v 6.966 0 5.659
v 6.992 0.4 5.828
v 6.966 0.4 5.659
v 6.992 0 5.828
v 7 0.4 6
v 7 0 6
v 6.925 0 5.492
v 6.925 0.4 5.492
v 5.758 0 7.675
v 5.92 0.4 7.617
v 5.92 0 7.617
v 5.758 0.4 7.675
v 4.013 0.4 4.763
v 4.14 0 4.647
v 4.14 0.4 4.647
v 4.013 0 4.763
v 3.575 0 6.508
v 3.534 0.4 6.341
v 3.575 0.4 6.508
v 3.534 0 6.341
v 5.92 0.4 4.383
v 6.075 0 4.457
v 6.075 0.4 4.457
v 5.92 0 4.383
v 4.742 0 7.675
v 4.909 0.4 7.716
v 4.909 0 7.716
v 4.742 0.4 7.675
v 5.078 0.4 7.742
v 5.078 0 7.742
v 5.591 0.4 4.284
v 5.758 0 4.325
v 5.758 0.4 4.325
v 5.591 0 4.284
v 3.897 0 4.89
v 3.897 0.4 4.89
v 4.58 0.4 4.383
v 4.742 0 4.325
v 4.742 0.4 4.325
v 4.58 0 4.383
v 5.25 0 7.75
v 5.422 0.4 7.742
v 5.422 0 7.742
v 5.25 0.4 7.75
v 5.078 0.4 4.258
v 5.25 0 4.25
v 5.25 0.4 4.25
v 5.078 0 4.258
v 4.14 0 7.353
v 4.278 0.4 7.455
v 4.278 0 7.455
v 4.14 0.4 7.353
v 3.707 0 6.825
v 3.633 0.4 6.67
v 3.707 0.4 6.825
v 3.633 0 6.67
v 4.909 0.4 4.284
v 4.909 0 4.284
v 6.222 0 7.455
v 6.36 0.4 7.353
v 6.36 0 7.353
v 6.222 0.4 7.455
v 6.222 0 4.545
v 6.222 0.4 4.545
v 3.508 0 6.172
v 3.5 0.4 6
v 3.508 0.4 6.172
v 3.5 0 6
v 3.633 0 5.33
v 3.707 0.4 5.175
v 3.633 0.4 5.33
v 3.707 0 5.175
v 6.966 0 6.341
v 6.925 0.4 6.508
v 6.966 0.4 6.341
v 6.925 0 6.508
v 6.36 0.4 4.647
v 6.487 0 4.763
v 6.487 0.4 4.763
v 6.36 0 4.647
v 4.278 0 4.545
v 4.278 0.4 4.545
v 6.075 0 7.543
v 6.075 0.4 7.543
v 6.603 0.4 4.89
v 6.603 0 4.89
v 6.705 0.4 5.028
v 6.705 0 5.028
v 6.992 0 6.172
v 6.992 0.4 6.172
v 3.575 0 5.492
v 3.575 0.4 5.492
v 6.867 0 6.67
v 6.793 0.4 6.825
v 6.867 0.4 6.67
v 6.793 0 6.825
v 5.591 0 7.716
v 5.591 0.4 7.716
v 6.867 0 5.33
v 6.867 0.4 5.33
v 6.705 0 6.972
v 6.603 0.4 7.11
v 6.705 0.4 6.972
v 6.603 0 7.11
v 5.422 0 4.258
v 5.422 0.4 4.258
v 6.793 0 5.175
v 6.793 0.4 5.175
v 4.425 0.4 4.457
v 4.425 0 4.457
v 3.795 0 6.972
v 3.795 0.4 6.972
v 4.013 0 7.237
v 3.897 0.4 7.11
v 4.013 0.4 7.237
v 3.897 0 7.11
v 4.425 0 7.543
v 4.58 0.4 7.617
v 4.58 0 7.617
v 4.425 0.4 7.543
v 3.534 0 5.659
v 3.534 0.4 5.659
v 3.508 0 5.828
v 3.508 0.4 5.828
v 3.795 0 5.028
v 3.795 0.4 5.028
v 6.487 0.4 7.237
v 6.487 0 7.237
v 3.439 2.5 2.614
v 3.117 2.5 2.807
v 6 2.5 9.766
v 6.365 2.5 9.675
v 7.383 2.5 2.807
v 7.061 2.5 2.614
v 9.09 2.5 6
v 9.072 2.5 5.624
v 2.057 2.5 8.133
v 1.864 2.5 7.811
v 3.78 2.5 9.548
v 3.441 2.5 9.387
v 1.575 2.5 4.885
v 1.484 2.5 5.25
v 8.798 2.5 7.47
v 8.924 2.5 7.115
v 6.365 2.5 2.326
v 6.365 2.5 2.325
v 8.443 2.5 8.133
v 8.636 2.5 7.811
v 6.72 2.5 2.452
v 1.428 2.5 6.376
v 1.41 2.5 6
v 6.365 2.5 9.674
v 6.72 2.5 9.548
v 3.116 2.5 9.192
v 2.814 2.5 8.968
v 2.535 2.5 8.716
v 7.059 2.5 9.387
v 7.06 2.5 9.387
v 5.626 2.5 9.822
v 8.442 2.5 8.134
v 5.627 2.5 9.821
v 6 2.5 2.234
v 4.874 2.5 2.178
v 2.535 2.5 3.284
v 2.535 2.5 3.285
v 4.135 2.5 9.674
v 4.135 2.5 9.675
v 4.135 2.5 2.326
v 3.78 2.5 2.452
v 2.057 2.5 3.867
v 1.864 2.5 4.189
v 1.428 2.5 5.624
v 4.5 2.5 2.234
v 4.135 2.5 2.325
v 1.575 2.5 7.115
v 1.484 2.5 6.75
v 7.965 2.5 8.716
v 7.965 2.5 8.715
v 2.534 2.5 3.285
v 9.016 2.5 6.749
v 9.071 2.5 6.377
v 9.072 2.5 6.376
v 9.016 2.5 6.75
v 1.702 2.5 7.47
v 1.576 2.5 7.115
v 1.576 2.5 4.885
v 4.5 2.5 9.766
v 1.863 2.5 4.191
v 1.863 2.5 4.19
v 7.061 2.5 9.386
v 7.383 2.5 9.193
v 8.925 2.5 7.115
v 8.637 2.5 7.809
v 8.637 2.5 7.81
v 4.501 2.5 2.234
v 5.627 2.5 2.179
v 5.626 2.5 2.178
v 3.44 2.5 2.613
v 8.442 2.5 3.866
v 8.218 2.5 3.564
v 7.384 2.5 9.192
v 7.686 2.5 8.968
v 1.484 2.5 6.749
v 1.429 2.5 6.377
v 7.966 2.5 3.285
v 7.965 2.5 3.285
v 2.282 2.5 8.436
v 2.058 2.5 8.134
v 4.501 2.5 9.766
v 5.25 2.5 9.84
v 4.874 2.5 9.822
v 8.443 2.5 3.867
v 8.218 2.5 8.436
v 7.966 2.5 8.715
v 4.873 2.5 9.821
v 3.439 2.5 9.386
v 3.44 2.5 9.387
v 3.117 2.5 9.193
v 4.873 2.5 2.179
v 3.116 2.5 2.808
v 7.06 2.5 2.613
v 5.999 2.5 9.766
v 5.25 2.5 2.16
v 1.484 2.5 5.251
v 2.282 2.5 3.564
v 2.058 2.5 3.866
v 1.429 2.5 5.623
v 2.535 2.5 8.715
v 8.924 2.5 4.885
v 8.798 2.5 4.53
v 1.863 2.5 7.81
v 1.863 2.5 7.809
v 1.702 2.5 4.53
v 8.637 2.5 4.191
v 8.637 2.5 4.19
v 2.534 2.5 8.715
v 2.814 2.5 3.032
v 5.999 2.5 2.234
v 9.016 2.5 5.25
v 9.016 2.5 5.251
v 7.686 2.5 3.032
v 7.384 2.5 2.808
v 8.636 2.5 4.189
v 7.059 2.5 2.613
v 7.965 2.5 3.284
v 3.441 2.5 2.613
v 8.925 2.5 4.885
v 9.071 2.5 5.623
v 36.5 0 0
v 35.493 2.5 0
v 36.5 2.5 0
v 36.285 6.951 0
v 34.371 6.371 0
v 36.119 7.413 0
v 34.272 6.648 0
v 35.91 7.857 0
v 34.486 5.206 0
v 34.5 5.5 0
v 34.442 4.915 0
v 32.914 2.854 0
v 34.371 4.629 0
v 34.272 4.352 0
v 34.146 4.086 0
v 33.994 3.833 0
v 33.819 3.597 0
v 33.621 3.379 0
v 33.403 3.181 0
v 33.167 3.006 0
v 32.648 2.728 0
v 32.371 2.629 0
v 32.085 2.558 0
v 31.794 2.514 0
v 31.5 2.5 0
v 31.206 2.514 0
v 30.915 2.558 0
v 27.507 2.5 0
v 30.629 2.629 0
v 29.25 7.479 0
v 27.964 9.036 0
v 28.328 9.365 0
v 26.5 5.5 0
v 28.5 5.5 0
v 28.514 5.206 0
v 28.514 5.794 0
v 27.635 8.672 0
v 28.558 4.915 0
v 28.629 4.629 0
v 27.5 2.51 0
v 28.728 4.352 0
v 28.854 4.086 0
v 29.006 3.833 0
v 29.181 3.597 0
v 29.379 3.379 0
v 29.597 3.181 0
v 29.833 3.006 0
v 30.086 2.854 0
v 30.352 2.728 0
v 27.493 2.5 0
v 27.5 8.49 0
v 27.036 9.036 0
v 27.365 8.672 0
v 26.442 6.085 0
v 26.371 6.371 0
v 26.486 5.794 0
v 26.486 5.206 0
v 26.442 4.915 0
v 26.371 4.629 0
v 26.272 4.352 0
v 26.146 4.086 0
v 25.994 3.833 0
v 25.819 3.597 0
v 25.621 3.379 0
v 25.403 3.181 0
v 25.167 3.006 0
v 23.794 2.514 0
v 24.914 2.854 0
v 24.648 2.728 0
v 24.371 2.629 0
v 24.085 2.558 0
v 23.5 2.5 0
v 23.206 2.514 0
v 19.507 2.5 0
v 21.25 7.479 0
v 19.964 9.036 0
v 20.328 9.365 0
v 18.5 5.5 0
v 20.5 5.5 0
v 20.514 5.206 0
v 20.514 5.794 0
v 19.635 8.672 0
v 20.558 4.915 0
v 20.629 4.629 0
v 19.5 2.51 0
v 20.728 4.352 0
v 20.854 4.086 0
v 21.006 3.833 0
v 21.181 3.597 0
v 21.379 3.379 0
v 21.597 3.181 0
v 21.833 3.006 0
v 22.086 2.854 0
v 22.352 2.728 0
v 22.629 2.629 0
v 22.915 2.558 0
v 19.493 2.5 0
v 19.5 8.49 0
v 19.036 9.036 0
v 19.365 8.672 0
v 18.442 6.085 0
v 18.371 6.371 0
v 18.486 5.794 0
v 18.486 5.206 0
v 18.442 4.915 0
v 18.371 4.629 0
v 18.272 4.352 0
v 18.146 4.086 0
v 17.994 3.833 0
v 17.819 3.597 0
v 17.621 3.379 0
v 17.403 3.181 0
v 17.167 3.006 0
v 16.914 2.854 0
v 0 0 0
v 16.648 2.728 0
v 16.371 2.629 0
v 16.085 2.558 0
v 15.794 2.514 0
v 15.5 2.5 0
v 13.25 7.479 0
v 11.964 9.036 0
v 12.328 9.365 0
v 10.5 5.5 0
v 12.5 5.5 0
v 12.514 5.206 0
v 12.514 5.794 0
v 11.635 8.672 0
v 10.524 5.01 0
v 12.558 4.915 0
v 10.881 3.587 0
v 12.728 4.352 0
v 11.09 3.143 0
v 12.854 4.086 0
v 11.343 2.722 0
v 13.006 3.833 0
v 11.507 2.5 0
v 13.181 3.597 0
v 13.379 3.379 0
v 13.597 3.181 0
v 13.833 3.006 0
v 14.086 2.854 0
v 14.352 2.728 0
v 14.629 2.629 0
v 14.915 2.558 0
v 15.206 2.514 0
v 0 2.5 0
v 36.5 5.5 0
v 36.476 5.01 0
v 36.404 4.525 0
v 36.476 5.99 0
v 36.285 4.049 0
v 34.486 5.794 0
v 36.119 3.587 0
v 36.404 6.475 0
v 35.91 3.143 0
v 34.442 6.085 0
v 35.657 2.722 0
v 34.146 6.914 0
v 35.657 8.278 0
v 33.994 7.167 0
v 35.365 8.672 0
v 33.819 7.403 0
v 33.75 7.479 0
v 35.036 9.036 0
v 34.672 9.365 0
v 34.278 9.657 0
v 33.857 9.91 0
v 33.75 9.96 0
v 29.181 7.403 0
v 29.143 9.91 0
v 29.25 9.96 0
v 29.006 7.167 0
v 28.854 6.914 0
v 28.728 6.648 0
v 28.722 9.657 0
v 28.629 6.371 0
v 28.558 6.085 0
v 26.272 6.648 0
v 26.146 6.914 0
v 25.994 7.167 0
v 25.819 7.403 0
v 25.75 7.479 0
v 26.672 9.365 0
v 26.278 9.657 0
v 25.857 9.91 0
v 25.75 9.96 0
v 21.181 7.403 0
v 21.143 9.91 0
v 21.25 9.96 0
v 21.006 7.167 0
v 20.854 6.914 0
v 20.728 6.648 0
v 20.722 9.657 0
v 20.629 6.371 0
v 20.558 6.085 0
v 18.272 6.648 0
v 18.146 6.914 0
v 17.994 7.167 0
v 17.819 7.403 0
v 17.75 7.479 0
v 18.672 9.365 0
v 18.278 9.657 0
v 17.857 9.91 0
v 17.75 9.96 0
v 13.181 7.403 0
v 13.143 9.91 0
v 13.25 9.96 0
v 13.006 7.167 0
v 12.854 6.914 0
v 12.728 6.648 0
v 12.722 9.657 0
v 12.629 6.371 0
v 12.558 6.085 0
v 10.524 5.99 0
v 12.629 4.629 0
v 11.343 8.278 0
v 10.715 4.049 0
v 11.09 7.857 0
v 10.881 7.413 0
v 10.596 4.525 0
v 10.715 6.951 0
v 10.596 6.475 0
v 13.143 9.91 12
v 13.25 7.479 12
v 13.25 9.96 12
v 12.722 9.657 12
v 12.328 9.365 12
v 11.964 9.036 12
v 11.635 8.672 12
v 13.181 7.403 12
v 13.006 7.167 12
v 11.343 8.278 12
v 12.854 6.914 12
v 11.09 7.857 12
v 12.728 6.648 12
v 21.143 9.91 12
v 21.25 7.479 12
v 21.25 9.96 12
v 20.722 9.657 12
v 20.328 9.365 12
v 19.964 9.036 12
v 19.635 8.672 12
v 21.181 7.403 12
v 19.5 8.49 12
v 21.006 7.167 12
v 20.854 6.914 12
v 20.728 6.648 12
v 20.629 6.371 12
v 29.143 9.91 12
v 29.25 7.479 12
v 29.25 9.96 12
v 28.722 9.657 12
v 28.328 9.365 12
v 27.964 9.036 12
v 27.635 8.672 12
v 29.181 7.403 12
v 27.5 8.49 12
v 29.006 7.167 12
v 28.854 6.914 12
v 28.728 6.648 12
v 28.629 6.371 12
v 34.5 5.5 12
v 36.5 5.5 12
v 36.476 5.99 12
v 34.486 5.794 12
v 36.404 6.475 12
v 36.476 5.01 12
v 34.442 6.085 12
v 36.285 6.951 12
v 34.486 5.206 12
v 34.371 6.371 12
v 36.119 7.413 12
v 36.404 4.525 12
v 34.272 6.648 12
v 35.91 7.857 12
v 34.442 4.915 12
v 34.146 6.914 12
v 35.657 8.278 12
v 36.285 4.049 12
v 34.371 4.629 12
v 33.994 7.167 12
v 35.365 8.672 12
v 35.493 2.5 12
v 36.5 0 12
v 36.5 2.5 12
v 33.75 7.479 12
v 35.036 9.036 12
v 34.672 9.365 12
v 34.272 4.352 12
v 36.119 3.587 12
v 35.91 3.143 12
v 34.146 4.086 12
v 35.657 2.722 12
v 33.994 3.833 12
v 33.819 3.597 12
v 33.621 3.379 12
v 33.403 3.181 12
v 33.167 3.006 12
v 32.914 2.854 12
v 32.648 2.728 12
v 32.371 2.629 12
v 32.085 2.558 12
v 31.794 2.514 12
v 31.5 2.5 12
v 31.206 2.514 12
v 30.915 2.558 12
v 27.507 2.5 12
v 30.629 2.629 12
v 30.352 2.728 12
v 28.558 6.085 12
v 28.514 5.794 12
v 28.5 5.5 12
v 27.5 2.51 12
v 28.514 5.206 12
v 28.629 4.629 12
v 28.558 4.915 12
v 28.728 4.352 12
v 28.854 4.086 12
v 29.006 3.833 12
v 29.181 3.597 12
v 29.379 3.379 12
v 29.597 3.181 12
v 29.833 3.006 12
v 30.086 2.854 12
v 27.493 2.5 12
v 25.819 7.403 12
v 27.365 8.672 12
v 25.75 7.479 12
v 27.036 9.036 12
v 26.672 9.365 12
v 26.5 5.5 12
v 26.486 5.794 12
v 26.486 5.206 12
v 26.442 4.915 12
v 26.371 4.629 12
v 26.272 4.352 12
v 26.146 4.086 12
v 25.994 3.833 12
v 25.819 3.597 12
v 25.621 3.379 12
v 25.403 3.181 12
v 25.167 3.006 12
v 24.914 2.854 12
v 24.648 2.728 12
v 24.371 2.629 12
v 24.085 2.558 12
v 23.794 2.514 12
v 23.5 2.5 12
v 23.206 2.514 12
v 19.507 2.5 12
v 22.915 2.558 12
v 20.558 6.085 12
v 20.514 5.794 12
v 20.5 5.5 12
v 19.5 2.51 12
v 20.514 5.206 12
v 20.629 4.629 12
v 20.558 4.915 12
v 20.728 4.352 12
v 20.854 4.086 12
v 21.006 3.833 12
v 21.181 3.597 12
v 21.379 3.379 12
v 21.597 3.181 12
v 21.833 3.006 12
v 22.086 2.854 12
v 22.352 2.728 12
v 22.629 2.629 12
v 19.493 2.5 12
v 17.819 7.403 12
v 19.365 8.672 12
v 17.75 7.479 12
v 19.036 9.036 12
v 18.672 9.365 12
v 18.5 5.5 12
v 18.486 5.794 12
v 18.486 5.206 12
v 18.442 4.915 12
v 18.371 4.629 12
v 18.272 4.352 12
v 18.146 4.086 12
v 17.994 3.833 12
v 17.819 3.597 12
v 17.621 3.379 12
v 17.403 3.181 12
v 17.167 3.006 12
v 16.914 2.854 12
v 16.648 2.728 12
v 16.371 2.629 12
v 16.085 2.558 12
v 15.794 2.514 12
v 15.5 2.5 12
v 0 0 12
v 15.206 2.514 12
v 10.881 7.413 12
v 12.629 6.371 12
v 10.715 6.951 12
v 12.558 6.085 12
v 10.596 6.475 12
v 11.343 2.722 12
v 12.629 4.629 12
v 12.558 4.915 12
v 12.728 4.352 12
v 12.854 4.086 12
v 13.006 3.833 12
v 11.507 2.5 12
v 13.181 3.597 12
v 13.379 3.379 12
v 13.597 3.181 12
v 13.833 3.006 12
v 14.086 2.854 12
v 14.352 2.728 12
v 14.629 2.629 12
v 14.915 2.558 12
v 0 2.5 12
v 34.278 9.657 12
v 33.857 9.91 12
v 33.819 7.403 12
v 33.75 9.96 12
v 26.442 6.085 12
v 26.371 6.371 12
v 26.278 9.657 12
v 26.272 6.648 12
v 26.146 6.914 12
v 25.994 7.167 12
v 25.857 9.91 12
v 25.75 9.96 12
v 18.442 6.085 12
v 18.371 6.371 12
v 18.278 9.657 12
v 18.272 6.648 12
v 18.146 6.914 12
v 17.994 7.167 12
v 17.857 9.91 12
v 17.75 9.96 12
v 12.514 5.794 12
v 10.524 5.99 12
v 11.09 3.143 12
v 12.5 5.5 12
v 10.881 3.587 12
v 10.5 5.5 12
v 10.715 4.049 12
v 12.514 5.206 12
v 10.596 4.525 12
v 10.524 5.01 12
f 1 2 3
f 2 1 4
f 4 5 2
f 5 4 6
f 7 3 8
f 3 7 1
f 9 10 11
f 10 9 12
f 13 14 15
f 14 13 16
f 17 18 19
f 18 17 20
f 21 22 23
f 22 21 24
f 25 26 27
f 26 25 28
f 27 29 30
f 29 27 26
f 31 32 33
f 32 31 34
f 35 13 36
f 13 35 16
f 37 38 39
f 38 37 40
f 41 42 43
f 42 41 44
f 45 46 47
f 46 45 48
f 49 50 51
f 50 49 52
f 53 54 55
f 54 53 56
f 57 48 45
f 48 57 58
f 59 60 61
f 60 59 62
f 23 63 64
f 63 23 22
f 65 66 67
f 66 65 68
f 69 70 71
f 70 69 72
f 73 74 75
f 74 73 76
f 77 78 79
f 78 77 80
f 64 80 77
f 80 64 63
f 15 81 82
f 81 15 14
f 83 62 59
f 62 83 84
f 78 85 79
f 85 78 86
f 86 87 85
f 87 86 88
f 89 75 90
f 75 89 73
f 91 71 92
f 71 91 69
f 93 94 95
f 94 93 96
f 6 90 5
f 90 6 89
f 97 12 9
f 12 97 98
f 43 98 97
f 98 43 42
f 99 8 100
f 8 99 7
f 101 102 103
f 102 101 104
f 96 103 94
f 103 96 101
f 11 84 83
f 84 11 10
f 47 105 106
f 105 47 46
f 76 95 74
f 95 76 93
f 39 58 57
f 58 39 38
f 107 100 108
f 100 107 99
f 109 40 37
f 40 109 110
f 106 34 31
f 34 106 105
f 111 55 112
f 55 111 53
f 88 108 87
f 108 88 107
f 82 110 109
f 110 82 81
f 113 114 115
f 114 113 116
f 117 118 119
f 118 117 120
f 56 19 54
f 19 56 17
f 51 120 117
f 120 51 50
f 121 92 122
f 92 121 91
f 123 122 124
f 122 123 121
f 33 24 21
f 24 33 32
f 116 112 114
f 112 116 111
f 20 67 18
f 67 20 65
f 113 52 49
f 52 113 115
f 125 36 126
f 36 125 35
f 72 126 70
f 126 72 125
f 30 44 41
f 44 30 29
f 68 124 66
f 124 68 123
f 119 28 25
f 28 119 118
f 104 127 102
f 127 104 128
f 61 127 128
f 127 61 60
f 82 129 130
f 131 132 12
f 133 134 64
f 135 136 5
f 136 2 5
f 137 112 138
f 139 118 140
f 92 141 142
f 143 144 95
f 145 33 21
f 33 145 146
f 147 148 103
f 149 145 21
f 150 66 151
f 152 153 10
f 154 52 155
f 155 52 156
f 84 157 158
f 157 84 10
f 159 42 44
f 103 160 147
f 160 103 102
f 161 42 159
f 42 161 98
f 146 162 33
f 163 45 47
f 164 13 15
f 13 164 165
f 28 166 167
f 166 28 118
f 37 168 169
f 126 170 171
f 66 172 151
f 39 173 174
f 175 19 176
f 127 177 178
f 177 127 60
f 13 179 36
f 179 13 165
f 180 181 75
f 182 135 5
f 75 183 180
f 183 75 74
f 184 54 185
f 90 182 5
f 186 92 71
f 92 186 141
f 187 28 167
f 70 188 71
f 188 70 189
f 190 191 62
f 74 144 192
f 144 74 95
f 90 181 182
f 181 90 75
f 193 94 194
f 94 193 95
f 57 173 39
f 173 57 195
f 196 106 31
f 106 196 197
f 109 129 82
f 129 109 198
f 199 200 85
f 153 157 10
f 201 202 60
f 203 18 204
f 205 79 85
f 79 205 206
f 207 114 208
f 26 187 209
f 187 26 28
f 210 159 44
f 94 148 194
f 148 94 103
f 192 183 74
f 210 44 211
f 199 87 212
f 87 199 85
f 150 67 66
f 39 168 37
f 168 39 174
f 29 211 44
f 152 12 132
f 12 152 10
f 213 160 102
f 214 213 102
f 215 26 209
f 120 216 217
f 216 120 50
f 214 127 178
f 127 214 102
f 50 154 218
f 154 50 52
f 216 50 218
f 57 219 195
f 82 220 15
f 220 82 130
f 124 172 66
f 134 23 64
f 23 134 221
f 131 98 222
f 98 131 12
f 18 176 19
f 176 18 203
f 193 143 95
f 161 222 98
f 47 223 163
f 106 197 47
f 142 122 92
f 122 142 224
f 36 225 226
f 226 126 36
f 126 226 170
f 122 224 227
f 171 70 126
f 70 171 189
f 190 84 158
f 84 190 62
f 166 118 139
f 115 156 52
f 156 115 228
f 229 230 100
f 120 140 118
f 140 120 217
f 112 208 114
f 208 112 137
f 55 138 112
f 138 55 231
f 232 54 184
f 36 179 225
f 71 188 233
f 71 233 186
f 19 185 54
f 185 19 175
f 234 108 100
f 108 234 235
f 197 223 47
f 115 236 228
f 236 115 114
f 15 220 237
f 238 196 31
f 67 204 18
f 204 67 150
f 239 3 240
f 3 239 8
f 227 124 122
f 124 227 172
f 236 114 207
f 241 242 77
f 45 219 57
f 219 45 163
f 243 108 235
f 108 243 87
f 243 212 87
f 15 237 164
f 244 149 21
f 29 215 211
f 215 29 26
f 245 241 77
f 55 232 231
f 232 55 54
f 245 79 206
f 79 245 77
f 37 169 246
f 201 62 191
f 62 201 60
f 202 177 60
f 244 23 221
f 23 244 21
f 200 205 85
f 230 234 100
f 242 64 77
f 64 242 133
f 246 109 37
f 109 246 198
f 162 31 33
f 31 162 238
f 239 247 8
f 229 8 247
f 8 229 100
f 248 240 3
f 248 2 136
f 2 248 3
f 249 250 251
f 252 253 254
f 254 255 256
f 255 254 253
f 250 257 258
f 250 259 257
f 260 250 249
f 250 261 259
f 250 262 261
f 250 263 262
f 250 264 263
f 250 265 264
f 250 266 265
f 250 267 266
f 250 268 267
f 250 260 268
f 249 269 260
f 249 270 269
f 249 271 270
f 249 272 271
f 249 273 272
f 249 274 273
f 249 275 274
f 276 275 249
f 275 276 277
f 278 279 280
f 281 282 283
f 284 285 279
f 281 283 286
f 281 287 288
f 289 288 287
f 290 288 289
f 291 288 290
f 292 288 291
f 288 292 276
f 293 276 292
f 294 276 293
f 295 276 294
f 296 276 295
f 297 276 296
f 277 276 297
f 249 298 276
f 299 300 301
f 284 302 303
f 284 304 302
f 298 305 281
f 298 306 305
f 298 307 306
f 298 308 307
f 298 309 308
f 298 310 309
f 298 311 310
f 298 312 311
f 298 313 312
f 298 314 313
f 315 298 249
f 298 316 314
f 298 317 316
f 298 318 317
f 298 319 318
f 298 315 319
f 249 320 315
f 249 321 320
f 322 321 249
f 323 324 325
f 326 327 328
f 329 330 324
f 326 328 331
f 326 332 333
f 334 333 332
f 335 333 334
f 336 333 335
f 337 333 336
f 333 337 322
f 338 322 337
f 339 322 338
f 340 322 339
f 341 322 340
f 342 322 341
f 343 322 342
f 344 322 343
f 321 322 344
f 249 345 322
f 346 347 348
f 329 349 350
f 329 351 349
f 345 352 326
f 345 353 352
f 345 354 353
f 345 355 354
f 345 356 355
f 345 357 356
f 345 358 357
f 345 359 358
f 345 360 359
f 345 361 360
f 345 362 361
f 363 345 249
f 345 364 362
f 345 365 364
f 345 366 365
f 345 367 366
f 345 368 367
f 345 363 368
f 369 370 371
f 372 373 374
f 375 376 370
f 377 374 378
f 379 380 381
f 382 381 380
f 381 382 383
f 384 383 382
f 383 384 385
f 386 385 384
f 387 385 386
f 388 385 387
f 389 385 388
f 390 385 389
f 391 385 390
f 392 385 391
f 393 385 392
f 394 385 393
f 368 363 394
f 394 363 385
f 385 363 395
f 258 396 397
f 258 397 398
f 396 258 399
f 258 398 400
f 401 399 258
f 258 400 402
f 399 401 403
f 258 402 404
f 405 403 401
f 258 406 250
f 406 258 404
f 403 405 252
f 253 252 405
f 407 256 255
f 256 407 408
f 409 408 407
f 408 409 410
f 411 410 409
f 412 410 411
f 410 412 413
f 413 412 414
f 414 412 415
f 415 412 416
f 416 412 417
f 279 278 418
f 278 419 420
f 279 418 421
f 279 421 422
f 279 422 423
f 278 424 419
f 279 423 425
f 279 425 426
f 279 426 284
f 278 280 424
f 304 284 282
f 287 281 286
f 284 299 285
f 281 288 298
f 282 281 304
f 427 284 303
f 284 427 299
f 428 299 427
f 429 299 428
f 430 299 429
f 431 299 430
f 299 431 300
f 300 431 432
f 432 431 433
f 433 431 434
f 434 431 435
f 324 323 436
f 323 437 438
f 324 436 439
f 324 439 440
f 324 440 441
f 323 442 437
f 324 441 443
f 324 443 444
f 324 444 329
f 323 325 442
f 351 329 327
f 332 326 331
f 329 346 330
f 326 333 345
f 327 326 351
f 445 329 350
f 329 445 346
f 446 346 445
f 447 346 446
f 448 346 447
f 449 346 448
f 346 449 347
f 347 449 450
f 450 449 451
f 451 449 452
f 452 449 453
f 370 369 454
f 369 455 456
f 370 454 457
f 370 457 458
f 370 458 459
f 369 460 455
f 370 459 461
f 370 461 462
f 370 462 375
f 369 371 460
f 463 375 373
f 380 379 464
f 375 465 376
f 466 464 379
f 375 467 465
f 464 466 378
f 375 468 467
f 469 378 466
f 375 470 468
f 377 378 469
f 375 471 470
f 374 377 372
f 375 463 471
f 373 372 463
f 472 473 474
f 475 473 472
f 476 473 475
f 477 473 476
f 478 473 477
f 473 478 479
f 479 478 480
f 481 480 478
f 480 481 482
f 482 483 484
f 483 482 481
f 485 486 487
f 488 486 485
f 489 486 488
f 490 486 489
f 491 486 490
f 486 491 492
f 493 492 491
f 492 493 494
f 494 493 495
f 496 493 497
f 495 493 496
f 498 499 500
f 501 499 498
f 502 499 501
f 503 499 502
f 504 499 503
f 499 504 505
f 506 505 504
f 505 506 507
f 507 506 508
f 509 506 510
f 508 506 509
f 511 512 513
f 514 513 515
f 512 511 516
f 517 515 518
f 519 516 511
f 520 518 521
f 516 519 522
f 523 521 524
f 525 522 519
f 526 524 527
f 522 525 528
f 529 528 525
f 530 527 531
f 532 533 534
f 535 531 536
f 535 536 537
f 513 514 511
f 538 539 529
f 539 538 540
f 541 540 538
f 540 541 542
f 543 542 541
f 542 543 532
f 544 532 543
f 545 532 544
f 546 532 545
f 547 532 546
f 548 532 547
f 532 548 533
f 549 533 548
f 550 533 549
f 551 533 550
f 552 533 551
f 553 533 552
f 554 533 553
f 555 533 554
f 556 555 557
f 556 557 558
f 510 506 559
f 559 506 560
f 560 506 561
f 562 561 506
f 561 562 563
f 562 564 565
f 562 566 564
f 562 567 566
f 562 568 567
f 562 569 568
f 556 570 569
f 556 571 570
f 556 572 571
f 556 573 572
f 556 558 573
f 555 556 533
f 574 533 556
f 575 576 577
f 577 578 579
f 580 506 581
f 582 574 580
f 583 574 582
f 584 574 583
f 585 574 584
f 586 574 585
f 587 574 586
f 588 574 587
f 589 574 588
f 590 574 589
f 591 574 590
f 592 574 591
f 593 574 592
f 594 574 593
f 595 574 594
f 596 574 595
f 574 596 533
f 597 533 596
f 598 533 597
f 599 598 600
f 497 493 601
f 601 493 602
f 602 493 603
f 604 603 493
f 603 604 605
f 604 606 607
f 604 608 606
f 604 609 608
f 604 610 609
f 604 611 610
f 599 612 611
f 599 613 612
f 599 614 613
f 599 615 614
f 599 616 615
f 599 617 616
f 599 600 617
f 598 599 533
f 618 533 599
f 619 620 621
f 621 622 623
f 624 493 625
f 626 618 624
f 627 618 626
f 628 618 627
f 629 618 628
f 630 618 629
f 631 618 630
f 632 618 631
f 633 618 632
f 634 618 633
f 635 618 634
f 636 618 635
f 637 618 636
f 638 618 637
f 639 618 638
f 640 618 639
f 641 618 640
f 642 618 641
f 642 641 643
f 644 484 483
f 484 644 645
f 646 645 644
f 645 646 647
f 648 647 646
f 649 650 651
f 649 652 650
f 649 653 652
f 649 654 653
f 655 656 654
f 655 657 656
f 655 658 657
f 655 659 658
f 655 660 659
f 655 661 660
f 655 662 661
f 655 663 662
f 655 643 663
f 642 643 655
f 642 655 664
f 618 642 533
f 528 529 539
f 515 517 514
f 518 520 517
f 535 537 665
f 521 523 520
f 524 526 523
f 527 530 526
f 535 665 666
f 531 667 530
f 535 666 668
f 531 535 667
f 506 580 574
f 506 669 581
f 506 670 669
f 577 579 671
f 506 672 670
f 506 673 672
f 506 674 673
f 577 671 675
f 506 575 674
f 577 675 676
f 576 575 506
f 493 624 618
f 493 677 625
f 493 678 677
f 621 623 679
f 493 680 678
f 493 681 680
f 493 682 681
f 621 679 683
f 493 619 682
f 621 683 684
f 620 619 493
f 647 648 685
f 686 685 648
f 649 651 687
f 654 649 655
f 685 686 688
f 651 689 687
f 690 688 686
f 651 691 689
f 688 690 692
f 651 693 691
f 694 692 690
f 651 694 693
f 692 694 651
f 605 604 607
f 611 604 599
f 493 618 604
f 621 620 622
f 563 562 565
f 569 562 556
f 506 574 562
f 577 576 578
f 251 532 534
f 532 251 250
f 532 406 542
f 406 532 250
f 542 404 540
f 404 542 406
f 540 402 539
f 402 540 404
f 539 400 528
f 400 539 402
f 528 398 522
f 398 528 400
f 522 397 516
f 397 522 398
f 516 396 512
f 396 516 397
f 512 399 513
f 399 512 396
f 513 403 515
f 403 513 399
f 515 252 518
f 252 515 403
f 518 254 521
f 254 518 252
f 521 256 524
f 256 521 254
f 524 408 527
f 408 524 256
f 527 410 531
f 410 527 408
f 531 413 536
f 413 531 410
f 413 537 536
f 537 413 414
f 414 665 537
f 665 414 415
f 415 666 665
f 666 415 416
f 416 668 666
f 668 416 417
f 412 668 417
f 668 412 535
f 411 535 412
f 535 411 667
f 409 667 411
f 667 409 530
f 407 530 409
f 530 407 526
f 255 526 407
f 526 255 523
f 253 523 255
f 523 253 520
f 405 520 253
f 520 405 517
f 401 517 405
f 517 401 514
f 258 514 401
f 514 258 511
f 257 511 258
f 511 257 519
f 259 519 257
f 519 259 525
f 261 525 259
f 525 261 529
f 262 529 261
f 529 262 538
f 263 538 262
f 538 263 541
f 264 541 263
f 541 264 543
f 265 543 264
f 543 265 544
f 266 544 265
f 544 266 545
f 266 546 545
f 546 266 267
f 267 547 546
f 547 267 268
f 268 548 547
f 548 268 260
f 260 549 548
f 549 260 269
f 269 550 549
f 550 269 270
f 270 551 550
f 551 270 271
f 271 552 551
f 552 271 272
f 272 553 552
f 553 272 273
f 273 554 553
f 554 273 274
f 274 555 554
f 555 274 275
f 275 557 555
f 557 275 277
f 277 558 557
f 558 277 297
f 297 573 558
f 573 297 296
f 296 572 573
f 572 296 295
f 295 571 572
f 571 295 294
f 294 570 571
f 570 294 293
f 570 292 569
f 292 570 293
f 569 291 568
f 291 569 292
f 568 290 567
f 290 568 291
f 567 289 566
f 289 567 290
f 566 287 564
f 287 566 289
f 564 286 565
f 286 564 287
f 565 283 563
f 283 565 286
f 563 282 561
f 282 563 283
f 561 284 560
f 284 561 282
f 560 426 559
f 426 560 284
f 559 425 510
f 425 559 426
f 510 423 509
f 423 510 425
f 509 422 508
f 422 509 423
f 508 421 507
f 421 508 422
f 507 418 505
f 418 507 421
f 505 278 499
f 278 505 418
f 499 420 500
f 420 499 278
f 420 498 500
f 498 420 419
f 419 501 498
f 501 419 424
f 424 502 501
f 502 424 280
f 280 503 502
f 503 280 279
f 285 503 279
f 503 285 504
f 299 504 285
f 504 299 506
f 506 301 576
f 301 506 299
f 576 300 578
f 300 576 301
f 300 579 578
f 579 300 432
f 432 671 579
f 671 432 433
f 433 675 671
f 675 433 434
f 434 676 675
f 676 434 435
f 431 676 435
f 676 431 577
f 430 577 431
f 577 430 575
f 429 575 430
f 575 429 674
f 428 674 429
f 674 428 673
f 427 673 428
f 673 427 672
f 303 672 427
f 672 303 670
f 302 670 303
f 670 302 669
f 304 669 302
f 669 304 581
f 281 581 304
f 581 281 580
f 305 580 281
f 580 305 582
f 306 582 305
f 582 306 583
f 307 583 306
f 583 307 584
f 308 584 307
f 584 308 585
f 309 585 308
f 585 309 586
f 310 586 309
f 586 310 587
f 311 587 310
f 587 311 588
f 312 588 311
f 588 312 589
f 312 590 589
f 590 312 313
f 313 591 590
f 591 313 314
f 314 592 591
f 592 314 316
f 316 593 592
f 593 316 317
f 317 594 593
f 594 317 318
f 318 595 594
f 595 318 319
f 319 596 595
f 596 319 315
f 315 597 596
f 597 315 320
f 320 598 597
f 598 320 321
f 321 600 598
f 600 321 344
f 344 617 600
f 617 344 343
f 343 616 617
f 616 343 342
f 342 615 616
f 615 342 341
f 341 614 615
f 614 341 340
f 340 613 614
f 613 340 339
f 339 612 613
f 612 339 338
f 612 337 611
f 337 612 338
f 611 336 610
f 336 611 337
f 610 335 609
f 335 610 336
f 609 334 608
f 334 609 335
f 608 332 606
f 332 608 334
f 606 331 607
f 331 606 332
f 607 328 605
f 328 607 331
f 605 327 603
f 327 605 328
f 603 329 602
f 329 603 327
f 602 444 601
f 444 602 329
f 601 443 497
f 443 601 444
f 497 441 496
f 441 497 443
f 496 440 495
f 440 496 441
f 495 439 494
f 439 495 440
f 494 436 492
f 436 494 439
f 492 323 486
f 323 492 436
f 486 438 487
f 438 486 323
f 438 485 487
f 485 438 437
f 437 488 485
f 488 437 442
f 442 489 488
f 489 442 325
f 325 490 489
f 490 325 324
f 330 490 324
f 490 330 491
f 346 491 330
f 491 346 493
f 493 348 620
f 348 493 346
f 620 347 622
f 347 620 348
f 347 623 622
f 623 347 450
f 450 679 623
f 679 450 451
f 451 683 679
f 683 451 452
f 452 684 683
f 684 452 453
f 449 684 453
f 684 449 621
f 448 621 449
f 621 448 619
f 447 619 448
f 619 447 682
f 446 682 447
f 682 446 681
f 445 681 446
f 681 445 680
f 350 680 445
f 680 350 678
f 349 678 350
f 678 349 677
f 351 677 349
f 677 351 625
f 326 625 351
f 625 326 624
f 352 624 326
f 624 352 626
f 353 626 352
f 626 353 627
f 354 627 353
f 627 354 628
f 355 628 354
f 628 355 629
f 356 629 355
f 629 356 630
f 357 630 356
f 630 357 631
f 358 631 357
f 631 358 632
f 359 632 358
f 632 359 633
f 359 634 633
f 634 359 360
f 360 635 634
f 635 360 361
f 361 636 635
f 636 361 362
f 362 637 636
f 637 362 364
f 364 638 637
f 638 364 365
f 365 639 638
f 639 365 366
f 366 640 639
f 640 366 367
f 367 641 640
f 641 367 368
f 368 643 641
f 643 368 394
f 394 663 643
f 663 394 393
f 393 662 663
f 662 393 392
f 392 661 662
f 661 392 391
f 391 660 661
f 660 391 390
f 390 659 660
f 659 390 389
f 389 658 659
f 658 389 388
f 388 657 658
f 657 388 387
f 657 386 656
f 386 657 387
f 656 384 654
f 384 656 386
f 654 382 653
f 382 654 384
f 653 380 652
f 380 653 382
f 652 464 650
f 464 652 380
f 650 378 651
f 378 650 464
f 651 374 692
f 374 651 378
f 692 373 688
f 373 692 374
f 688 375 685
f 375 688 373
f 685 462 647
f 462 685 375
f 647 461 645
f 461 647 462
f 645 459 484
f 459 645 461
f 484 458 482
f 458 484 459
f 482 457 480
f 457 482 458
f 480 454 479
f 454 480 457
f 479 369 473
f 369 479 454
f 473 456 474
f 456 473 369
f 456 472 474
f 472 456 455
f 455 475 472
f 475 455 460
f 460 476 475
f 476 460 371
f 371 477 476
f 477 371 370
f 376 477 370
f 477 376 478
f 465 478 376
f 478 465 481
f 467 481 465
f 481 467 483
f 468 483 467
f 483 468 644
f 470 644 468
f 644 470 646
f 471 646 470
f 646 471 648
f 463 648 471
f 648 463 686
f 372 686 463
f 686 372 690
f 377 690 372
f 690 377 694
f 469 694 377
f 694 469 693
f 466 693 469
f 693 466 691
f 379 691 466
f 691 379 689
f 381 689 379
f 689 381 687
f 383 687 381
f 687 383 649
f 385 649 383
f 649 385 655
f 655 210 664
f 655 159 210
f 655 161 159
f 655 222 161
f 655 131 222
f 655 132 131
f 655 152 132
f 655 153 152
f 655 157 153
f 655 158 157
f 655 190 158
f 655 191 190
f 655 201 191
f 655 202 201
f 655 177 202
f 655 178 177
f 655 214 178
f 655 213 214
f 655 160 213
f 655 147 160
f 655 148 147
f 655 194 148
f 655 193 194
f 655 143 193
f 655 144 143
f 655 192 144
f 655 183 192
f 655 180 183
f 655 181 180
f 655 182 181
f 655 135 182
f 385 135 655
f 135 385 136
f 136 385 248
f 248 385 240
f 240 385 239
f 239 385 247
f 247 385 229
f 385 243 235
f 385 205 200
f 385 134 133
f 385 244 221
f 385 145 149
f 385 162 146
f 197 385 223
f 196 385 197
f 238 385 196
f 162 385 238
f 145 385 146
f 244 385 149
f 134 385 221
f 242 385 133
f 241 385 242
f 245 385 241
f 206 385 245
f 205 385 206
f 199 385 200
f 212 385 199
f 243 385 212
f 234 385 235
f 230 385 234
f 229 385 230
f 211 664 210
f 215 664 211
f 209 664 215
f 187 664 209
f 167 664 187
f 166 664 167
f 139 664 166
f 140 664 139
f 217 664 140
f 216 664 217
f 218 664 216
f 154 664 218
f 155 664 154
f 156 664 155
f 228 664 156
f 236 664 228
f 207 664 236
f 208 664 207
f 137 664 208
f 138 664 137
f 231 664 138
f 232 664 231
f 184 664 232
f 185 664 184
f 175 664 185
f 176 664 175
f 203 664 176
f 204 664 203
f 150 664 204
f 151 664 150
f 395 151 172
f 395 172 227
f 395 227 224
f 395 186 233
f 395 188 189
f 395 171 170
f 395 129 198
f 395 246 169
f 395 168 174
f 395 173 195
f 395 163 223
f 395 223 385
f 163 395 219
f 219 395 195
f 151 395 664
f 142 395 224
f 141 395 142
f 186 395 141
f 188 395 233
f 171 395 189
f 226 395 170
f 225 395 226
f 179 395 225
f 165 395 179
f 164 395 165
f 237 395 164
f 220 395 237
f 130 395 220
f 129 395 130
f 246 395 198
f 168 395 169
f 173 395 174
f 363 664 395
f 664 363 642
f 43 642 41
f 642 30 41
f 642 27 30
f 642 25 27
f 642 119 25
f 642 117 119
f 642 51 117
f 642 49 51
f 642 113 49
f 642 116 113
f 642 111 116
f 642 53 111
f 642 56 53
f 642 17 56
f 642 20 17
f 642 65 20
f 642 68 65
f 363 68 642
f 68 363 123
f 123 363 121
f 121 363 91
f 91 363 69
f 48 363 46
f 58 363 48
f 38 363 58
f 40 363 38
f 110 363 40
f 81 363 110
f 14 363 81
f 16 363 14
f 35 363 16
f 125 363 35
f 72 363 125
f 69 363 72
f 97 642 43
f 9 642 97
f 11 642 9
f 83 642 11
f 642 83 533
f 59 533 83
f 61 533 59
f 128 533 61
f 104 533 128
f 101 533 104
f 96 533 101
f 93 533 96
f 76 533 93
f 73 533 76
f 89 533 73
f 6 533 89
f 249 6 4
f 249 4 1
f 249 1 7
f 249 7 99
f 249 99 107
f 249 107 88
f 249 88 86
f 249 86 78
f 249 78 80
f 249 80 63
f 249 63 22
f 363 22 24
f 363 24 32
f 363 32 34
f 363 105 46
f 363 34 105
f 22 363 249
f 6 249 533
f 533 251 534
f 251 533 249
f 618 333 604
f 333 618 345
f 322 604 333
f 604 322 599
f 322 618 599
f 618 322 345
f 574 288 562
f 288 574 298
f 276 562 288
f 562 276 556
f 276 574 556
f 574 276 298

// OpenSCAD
// Cable clip: snaps one or more cables into a row of open rings. Stick it under a desk with
// double-sided tape, or screw it on.

/* [Cables] */
// Cable diameter (mm)
cable_d = 6; // [3:0.5:15]
// How many cables
count = 3; // [1:1:6]
// Opening (smaller grips tighter)
opening = 0.75; // [0.5:0.05:0.9]

/* [Clip] */
// Clip length (mm)
length = 12; // [6:1:30]
// Wall thickness (mm)
wall = 2; // [1.2:0.2:4]
// Screw hole
screw_hole = true;
// Screw size (mm)
screw_d = 3.5; // [2.5:0.1:5]

/* [Hidden] */
$fn = $preview ? 32 : 64;
pitch = cable_d + wall;
base_len = count * pitch + wall + (screw_hole ? screw_d * 3 : 0);
base_t = wall + 0.5;
x0 = (screw_hole ? screw_d * 3 : 0) + wall / 2 + pitch / 2;

module ring() {
  difference() {
    circle(d = cable_d + 2 * wall);
    circle(d = cable_d);
    translate([-cable_d * opening / 2, 0]) square([cable_d * opening, cable_d]);
  }
}

difference() {
  linear_extrude(length) {
    square([base_len, base_t]);
    for (i = [0 : count - 1]) translate([x0 + i * pitch, base_t + cable_d / 2]) ring();
  }
  if (screw_hole)
    translate([screw_d * 1.5, -1, length / 2]) rotate([-90, 0, 0]) {
      cylinder(d = screw_d, h = base_t + 2);
      translate([0, 0, base_t + 1 - screw_d * 0.6]) cylinder(d1 = screw_d, d2 = screw_d * 2.2, h = screw_d * 0.6 + 0.01);
    }
}
